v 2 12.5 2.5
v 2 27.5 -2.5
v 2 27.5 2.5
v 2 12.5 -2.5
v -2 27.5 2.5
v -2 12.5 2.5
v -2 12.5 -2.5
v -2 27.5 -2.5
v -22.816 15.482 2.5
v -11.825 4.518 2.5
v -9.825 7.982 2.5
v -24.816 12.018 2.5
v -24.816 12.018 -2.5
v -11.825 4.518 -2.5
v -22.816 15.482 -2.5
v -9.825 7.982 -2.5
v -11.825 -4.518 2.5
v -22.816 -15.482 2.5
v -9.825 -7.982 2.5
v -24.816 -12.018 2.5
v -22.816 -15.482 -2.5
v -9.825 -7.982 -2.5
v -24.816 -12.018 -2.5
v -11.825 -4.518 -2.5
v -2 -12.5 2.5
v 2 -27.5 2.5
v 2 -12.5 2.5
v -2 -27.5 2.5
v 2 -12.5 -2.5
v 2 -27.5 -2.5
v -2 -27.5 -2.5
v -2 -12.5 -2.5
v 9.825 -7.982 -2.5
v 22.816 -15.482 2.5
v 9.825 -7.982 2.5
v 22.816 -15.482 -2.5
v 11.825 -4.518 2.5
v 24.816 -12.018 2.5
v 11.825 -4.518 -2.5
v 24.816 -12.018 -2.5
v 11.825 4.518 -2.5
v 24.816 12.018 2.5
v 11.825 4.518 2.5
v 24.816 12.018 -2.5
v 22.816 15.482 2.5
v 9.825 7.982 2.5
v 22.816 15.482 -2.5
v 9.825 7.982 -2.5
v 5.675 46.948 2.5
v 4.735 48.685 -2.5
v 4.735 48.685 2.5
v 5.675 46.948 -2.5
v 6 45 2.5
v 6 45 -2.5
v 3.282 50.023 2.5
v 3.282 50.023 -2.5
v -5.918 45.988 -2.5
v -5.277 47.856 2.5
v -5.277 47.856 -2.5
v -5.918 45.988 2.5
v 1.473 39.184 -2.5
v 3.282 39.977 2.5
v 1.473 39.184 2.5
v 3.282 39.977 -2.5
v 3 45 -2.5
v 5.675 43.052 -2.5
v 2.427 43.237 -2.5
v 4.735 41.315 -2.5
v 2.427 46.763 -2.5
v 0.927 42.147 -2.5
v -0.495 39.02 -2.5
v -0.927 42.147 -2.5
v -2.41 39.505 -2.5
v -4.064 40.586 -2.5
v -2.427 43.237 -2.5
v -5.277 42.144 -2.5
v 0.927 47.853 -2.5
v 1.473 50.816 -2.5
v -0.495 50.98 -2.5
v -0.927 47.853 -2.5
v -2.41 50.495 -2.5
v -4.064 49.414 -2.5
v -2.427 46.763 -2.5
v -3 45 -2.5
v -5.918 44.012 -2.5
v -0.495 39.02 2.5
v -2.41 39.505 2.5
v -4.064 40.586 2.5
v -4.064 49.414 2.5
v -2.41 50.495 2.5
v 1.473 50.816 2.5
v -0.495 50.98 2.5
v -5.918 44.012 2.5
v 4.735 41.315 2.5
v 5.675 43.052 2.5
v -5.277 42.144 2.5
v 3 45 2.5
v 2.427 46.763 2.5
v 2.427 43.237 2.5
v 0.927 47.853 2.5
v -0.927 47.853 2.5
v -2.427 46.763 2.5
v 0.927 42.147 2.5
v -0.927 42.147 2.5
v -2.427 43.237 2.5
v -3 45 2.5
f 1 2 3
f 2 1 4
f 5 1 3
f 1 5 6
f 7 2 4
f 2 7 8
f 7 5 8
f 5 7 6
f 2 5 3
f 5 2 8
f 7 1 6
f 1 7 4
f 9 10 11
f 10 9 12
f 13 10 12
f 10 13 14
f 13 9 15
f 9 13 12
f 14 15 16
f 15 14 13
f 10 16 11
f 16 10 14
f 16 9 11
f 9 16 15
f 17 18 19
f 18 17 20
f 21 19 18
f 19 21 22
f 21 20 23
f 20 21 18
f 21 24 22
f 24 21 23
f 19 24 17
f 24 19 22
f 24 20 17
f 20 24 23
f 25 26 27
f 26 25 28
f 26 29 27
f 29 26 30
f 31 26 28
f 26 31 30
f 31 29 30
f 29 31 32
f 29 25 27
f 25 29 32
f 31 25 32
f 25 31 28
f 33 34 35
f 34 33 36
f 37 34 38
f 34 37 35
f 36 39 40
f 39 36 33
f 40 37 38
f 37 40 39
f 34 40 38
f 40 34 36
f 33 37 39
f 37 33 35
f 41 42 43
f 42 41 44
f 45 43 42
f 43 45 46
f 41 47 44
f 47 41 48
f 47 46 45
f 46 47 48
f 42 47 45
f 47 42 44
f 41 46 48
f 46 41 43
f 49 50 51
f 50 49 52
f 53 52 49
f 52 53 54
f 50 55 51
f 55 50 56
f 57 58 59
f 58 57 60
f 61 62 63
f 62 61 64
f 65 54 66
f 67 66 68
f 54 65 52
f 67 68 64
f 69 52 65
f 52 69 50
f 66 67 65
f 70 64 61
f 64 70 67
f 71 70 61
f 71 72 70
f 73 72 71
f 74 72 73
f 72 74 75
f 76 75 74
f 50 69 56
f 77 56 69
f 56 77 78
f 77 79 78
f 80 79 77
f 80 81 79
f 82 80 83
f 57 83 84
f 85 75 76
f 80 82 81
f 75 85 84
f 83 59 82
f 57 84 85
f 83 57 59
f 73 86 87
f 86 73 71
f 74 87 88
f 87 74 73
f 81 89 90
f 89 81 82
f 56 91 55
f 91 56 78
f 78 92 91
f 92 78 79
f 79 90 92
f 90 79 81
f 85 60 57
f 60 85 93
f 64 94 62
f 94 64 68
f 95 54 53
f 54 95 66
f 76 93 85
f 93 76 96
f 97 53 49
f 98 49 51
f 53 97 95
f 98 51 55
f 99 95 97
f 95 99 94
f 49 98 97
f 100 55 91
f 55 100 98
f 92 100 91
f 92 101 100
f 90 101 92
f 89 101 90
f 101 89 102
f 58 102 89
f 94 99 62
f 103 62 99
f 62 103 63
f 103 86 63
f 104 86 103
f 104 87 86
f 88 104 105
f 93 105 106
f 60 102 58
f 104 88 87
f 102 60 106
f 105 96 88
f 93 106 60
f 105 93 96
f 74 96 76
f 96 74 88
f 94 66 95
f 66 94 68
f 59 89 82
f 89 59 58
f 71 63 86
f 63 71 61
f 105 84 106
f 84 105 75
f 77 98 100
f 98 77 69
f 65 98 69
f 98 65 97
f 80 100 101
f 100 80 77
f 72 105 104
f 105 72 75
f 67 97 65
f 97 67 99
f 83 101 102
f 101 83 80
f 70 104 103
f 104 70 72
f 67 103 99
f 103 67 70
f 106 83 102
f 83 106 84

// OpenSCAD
h = 5;
filename = "car.dxf";
scale = 0.28;

module feature(){
		translate([0,30,0])scale([scale,scale,1])translate([0,0,-h/2])linear_extrude(height = h) import(filename);
}

module six_feature(){
	union() {
		for(i = [0:360 / 6:360]){
			rotate([0,0,i]){
				feature();
				#translate([0,20,0])cube([4,15,5], center=true);
			}
		}
	}
}

module base(){
	difference(){
		scale([0.7,0.7,1])translate([0,0,-h/2])linear_extrude(height = h) import("snowflake.dxf");
		difference(){
			translate([0,0,-2.5])cylinder(h,40,40);
			translate([0,0,-2.5])cylinder(h,20,20);
		}
	}
}


module loop() {
	translate([0,45,0]) {
		union(){
			difference() {
				cylinder(h,6,6, center = true);
				cylinder(h,3,3, center = true);
			}
			//translate([0,-10,0])cube([5,10,5], center = true);
		}
	}
}


union() {
	six_feature();
	base();
	loop();
}

//translate([0,0,-5]) color([0,1,0]) cylinder(h,40,40);
